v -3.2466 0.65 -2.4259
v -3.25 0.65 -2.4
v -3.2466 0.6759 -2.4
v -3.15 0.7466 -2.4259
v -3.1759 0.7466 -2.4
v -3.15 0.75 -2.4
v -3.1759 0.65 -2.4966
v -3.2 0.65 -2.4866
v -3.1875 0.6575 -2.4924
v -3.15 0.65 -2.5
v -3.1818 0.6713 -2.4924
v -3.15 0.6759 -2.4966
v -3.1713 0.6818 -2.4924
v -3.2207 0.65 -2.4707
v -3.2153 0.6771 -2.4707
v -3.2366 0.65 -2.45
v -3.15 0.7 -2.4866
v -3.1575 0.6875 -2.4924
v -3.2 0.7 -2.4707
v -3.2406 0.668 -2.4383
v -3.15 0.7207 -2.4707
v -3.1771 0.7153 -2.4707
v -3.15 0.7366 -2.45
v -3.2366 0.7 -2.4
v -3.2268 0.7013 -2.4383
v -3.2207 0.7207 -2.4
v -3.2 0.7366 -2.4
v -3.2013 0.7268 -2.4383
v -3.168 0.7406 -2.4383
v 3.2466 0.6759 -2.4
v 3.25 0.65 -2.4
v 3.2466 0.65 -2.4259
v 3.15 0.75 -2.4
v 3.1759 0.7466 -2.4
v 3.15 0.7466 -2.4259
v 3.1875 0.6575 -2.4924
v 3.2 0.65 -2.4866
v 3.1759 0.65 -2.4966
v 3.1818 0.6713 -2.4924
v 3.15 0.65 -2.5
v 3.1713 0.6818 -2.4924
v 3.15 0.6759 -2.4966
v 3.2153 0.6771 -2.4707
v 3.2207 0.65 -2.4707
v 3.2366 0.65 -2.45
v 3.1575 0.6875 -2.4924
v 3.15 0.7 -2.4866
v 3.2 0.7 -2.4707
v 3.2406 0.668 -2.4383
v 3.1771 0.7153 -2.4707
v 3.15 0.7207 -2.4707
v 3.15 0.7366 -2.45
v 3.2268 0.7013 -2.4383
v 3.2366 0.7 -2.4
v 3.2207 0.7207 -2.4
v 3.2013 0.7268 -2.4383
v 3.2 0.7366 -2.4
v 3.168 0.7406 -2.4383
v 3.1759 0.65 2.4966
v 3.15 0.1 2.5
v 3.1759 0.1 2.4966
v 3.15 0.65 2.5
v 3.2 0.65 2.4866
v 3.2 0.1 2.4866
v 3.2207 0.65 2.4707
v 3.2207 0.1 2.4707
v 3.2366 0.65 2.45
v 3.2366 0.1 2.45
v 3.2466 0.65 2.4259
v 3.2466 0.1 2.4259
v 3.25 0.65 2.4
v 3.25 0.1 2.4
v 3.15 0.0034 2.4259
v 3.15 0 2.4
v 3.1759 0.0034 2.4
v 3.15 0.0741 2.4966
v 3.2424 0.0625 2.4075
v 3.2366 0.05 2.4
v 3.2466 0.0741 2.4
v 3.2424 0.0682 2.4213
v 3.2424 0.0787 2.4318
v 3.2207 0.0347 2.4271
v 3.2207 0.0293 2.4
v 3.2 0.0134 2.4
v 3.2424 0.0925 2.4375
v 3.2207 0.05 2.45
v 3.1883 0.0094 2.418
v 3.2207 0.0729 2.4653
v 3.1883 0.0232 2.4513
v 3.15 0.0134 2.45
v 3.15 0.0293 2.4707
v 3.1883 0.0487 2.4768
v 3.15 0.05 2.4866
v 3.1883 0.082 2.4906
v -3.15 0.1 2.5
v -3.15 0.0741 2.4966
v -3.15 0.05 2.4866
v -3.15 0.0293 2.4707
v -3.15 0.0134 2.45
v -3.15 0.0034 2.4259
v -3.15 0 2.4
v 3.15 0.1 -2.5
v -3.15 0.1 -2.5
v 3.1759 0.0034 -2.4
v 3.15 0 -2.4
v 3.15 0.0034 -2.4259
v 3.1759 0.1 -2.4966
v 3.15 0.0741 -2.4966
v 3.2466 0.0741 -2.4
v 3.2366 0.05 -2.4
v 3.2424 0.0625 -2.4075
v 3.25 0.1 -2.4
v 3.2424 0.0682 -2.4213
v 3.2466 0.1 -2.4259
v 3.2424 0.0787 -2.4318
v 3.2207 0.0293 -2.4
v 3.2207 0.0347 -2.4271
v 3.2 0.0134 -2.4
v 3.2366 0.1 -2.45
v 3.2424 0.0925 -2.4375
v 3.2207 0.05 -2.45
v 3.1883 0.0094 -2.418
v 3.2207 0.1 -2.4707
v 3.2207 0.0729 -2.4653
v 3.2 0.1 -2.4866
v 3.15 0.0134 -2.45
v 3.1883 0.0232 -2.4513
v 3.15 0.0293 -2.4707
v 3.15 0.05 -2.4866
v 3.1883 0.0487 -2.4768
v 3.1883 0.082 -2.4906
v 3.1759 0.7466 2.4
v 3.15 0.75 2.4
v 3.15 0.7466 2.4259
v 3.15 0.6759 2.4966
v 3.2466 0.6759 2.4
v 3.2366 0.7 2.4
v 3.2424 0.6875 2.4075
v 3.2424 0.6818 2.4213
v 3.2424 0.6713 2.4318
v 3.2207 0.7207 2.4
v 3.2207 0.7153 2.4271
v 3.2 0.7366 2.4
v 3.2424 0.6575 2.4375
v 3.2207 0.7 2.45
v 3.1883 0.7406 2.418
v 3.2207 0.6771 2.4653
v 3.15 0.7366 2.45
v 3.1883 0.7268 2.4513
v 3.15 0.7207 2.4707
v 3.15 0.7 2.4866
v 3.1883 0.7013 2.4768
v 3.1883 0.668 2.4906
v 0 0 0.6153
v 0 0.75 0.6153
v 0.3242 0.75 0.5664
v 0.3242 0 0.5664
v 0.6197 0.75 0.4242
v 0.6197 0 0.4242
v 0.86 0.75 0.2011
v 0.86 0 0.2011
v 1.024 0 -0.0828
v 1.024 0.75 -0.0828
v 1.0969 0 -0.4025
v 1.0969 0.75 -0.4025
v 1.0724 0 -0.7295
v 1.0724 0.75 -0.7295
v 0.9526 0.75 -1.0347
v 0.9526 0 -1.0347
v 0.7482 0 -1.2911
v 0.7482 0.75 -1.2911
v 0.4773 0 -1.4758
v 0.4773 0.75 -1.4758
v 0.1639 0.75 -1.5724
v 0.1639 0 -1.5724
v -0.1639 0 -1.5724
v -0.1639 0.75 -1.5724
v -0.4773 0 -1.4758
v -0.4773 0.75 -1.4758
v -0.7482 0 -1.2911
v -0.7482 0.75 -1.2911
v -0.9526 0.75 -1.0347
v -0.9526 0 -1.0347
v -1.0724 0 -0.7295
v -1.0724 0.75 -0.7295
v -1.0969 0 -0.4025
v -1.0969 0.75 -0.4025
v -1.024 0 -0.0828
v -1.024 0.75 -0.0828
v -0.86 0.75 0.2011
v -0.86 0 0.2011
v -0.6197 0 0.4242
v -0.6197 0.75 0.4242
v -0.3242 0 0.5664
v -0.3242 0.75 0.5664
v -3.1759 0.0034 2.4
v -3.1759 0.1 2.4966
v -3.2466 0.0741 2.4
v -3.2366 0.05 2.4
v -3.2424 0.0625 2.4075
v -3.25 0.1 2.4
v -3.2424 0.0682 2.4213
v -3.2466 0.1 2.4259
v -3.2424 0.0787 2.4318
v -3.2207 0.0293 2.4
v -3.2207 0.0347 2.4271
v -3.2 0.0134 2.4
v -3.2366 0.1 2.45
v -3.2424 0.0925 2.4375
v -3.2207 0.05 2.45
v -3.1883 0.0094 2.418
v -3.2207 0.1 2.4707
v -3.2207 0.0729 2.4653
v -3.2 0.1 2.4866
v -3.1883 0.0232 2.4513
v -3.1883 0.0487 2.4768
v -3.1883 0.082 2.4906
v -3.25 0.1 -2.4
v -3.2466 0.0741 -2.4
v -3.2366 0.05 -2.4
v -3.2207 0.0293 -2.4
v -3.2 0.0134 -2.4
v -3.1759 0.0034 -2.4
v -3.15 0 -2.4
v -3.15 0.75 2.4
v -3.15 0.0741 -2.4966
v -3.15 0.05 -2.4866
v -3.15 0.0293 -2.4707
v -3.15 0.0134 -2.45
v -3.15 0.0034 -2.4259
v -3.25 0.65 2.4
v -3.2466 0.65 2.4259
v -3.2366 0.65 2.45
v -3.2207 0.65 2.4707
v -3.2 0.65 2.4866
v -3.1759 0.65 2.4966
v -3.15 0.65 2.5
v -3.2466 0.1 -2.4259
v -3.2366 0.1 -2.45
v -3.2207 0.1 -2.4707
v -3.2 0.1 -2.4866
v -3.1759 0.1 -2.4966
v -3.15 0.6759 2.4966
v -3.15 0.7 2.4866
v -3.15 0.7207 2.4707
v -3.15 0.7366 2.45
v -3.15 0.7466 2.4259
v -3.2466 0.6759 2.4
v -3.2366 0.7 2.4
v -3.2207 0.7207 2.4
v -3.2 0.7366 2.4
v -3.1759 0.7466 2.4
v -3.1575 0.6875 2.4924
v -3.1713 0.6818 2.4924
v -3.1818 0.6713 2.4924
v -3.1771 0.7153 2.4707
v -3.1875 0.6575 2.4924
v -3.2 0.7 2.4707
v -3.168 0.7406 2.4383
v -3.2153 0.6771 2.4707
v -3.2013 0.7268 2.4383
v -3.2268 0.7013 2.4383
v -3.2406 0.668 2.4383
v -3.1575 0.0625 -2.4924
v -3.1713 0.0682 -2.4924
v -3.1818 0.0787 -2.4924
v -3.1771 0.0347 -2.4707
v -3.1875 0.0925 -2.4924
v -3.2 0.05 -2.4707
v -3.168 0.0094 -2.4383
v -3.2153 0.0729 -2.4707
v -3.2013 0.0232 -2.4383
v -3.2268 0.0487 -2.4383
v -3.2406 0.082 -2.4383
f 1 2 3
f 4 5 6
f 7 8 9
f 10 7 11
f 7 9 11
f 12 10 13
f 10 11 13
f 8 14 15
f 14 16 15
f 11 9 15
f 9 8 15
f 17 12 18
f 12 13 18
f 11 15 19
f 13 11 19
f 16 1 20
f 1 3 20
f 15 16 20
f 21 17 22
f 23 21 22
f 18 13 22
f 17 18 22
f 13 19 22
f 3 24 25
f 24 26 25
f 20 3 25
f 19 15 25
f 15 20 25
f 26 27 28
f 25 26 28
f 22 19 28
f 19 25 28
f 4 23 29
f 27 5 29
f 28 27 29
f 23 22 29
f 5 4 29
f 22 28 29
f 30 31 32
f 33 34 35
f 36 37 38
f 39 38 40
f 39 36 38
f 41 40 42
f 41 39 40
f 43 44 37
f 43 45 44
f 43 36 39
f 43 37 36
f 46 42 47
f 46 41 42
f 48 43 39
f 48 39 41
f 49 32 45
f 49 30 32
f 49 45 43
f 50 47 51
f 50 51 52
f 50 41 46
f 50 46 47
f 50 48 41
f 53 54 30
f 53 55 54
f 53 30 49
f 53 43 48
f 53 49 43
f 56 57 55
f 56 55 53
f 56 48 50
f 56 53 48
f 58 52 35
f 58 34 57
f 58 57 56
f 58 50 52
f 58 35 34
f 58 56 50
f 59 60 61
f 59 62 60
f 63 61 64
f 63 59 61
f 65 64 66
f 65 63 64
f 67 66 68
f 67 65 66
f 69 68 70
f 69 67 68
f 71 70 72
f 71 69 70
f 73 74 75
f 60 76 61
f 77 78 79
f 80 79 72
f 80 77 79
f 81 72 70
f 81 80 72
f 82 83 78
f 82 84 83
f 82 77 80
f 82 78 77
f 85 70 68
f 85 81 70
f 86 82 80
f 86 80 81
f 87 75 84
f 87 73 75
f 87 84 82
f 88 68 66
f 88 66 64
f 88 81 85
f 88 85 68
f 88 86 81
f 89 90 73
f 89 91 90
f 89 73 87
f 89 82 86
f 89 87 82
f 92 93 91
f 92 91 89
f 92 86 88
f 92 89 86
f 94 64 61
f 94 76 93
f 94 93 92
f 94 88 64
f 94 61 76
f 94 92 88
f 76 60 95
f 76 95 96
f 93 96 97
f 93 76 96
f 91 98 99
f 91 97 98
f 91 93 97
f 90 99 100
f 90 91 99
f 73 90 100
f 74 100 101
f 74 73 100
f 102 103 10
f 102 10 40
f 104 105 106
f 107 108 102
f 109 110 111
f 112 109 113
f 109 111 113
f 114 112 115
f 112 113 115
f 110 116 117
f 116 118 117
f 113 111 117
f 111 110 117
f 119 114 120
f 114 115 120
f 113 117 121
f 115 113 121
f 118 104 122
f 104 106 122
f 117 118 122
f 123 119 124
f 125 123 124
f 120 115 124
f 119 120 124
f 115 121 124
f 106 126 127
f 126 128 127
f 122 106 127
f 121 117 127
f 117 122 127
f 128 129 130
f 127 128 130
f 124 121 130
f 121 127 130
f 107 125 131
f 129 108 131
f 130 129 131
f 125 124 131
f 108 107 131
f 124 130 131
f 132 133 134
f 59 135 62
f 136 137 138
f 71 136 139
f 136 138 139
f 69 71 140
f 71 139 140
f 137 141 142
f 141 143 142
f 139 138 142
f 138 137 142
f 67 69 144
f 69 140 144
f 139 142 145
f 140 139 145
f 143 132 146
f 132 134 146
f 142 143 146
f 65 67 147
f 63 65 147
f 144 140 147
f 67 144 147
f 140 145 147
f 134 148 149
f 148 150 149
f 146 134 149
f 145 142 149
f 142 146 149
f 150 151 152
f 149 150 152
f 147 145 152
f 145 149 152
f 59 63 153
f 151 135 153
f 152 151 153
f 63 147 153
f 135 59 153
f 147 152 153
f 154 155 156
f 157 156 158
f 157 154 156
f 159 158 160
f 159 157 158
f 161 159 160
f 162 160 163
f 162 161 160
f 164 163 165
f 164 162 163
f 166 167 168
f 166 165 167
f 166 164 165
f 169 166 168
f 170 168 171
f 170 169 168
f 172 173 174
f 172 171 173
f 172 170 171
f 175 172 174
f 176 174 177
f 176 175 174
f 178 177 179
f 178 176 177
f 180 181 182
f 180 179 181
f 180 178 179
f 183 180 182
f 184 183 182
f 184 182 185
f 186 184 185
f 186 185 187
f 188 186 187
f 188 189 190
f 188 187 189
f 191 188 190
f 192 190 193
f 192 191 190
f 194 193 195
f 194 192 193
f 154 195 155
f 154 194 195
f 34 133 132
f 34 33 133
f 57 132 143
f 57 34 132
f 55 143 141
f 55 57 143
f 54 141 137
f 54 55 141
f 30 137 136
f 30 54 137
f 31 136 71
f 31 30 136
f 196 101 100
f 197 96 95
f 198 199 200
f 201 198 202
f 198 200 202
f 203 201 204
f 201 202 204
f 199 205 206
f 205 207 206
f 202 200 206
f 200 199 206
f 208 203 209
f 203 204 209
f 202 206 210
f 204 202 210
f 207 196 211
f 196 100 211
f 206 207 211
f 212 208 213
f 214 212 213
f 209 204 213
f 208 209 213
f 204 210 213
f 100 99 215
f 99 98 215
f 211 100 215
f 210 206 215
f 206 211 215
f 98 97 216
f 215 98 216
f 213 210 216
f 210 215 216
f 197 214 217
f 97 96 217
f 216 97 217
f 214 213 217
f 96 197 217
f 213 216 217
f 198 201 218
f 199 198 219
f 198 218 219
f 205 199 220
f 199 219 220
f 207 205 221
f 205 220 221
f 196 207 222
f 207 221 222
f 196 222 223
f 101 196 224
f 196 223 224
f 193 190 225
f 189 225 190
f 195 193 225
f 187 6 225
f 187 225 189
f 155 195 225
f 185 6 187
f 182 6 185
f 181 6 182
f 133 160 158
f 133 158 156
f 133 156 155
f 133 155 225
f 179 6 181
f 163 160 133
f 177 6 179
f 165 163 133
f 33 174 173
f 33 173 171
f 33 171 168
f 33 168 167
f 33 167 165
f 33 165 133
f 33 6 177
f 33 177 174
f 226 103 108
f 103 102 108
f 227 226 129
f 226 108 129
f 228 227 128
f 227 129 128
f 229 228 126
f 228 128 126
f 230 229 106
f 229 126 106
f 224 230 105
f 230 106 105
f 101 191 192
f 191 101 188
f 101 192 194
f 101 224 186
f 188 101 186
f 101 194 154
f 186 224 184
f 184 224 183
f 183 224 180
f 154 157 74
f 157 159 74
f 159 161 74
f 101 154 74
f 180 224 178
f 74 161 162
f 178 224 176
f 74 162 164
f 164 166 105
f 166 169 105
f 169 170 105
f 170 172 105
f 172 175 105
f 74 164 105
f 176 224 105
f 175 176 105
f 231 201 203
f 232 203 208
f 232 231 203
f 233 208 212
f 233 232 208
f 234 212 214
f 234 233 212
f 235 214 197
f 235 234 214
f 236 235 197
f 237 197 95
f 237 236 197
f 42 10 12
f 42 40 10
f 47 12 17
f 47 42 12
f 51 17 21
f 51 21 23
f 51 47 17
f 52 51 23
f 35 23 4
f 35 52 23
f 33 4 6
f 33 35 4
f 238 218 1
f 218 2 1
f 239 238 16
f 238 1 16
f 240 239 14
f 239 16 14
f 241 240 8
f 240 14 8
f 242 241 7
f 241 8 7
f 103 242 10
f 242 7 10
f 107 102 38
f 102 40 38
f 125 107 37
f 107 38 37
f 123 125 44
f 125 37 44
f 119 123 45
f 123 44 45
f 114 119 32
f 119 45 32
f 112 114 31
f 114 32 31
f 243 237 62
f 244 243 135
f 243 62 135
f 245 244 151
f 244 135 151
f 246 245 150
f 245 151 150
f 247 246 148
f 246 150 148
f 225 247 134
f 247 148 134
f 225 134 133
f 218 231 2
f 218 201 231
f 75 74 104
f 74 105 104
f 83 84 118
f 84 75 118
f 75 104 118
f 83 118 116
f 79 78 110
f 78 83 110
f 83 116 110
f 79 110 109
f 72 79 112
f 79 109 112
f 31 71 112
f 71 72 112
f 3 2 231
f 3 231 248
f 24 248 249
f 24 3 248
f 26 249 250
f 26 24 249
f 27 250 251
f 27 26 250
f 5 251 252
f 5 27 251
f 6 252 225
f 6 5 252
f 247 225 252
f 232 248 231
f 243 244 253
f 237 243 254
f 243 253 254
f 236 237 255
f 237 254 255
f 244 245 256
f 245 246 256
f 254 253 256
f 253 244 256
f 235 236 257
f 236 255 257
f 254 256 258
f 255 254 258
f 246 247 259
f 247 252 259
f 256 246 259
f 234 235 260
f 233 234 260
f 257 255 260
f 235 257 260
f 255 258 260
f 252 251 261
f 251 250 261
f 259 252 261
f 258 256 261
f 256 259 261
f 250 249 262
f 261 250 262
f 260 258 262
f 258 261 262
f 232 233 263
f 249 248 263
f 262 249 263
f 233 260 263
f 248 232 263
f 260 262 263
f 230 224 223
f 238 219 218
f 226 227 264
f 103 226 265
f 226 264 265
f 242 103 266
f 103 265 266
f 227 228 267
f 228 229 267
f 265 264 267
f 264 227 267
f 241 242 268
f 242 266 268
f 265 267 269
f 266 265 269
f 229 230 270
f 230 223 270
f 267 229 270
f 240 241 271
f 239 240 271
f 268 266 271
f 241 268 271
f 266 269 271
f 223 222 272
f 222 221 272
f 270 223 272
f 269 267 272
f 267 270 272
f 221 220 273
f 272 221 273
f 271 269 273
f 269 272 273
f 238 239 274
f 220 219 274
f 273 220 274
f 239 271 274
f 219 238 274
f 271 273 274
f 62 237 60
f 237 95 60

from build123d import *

# Parameters (mm, degrees)
SKETCH1_W           = 6.5
SKETCH1_H           = 5
BOSS_EXTRUDE1_DEPTH = 0.75
SKETCH2_R           = 1.1
CUT_EXTRUDE1_DEPTH  = 5.168333
FILLET1_R           = 0.1


with BuildPart() as part:
    # Sketch1 → Boss-Extrude1 (new body)
    with BuildSketch(Plane(origin=(0, 0, 0), x_dir=(1, 0, 0), z_dir=(0, 1, 0))):
        Rectangle(SKETCH1_W, SKETCH1_H)
    extrude(amount=BOSS_EXTRUDE1_DEPTH)

    # Sketch2 → Cut-Extrude1 (cut, through all)
    with BuildSketch(Plane(origin=(0, 0, 0), x_dir=(1, 0, 0), z_dir=(0, 1, 0))):
        with Locations(Location((0, 0.484711092, 0), (0, 0, 270))):
            Circle(SKETCH2_R)
    extrude(amount=CUT_EXTRUDE1_DEPTH, mode=Mode.SUBTRACT)

    # Fillet1
    fillet1_edges = [part.edges().sort_by_distance(p)[0] for p in [
        (-3.25, 0.75, 0),
        (0, 0.75, 2.5),
        (3.25, 0.75, 0),
        (0, 0, 2.5),
        (-3.25, 0, 0),
        (0, 0, -2.5),
        (3.25, 0, 0),
        (3.25, 0.375, 2.5),
        (-3.25, 0.375, 2.5),
        (-3.25, 0.375, -2.5),
        (3.25, 0.375, -2.5),
        (0, 0.75, -2.5),
    ]]
    fillet(fillet1_edges, radius=FILLET1_R)


solid = part.part
